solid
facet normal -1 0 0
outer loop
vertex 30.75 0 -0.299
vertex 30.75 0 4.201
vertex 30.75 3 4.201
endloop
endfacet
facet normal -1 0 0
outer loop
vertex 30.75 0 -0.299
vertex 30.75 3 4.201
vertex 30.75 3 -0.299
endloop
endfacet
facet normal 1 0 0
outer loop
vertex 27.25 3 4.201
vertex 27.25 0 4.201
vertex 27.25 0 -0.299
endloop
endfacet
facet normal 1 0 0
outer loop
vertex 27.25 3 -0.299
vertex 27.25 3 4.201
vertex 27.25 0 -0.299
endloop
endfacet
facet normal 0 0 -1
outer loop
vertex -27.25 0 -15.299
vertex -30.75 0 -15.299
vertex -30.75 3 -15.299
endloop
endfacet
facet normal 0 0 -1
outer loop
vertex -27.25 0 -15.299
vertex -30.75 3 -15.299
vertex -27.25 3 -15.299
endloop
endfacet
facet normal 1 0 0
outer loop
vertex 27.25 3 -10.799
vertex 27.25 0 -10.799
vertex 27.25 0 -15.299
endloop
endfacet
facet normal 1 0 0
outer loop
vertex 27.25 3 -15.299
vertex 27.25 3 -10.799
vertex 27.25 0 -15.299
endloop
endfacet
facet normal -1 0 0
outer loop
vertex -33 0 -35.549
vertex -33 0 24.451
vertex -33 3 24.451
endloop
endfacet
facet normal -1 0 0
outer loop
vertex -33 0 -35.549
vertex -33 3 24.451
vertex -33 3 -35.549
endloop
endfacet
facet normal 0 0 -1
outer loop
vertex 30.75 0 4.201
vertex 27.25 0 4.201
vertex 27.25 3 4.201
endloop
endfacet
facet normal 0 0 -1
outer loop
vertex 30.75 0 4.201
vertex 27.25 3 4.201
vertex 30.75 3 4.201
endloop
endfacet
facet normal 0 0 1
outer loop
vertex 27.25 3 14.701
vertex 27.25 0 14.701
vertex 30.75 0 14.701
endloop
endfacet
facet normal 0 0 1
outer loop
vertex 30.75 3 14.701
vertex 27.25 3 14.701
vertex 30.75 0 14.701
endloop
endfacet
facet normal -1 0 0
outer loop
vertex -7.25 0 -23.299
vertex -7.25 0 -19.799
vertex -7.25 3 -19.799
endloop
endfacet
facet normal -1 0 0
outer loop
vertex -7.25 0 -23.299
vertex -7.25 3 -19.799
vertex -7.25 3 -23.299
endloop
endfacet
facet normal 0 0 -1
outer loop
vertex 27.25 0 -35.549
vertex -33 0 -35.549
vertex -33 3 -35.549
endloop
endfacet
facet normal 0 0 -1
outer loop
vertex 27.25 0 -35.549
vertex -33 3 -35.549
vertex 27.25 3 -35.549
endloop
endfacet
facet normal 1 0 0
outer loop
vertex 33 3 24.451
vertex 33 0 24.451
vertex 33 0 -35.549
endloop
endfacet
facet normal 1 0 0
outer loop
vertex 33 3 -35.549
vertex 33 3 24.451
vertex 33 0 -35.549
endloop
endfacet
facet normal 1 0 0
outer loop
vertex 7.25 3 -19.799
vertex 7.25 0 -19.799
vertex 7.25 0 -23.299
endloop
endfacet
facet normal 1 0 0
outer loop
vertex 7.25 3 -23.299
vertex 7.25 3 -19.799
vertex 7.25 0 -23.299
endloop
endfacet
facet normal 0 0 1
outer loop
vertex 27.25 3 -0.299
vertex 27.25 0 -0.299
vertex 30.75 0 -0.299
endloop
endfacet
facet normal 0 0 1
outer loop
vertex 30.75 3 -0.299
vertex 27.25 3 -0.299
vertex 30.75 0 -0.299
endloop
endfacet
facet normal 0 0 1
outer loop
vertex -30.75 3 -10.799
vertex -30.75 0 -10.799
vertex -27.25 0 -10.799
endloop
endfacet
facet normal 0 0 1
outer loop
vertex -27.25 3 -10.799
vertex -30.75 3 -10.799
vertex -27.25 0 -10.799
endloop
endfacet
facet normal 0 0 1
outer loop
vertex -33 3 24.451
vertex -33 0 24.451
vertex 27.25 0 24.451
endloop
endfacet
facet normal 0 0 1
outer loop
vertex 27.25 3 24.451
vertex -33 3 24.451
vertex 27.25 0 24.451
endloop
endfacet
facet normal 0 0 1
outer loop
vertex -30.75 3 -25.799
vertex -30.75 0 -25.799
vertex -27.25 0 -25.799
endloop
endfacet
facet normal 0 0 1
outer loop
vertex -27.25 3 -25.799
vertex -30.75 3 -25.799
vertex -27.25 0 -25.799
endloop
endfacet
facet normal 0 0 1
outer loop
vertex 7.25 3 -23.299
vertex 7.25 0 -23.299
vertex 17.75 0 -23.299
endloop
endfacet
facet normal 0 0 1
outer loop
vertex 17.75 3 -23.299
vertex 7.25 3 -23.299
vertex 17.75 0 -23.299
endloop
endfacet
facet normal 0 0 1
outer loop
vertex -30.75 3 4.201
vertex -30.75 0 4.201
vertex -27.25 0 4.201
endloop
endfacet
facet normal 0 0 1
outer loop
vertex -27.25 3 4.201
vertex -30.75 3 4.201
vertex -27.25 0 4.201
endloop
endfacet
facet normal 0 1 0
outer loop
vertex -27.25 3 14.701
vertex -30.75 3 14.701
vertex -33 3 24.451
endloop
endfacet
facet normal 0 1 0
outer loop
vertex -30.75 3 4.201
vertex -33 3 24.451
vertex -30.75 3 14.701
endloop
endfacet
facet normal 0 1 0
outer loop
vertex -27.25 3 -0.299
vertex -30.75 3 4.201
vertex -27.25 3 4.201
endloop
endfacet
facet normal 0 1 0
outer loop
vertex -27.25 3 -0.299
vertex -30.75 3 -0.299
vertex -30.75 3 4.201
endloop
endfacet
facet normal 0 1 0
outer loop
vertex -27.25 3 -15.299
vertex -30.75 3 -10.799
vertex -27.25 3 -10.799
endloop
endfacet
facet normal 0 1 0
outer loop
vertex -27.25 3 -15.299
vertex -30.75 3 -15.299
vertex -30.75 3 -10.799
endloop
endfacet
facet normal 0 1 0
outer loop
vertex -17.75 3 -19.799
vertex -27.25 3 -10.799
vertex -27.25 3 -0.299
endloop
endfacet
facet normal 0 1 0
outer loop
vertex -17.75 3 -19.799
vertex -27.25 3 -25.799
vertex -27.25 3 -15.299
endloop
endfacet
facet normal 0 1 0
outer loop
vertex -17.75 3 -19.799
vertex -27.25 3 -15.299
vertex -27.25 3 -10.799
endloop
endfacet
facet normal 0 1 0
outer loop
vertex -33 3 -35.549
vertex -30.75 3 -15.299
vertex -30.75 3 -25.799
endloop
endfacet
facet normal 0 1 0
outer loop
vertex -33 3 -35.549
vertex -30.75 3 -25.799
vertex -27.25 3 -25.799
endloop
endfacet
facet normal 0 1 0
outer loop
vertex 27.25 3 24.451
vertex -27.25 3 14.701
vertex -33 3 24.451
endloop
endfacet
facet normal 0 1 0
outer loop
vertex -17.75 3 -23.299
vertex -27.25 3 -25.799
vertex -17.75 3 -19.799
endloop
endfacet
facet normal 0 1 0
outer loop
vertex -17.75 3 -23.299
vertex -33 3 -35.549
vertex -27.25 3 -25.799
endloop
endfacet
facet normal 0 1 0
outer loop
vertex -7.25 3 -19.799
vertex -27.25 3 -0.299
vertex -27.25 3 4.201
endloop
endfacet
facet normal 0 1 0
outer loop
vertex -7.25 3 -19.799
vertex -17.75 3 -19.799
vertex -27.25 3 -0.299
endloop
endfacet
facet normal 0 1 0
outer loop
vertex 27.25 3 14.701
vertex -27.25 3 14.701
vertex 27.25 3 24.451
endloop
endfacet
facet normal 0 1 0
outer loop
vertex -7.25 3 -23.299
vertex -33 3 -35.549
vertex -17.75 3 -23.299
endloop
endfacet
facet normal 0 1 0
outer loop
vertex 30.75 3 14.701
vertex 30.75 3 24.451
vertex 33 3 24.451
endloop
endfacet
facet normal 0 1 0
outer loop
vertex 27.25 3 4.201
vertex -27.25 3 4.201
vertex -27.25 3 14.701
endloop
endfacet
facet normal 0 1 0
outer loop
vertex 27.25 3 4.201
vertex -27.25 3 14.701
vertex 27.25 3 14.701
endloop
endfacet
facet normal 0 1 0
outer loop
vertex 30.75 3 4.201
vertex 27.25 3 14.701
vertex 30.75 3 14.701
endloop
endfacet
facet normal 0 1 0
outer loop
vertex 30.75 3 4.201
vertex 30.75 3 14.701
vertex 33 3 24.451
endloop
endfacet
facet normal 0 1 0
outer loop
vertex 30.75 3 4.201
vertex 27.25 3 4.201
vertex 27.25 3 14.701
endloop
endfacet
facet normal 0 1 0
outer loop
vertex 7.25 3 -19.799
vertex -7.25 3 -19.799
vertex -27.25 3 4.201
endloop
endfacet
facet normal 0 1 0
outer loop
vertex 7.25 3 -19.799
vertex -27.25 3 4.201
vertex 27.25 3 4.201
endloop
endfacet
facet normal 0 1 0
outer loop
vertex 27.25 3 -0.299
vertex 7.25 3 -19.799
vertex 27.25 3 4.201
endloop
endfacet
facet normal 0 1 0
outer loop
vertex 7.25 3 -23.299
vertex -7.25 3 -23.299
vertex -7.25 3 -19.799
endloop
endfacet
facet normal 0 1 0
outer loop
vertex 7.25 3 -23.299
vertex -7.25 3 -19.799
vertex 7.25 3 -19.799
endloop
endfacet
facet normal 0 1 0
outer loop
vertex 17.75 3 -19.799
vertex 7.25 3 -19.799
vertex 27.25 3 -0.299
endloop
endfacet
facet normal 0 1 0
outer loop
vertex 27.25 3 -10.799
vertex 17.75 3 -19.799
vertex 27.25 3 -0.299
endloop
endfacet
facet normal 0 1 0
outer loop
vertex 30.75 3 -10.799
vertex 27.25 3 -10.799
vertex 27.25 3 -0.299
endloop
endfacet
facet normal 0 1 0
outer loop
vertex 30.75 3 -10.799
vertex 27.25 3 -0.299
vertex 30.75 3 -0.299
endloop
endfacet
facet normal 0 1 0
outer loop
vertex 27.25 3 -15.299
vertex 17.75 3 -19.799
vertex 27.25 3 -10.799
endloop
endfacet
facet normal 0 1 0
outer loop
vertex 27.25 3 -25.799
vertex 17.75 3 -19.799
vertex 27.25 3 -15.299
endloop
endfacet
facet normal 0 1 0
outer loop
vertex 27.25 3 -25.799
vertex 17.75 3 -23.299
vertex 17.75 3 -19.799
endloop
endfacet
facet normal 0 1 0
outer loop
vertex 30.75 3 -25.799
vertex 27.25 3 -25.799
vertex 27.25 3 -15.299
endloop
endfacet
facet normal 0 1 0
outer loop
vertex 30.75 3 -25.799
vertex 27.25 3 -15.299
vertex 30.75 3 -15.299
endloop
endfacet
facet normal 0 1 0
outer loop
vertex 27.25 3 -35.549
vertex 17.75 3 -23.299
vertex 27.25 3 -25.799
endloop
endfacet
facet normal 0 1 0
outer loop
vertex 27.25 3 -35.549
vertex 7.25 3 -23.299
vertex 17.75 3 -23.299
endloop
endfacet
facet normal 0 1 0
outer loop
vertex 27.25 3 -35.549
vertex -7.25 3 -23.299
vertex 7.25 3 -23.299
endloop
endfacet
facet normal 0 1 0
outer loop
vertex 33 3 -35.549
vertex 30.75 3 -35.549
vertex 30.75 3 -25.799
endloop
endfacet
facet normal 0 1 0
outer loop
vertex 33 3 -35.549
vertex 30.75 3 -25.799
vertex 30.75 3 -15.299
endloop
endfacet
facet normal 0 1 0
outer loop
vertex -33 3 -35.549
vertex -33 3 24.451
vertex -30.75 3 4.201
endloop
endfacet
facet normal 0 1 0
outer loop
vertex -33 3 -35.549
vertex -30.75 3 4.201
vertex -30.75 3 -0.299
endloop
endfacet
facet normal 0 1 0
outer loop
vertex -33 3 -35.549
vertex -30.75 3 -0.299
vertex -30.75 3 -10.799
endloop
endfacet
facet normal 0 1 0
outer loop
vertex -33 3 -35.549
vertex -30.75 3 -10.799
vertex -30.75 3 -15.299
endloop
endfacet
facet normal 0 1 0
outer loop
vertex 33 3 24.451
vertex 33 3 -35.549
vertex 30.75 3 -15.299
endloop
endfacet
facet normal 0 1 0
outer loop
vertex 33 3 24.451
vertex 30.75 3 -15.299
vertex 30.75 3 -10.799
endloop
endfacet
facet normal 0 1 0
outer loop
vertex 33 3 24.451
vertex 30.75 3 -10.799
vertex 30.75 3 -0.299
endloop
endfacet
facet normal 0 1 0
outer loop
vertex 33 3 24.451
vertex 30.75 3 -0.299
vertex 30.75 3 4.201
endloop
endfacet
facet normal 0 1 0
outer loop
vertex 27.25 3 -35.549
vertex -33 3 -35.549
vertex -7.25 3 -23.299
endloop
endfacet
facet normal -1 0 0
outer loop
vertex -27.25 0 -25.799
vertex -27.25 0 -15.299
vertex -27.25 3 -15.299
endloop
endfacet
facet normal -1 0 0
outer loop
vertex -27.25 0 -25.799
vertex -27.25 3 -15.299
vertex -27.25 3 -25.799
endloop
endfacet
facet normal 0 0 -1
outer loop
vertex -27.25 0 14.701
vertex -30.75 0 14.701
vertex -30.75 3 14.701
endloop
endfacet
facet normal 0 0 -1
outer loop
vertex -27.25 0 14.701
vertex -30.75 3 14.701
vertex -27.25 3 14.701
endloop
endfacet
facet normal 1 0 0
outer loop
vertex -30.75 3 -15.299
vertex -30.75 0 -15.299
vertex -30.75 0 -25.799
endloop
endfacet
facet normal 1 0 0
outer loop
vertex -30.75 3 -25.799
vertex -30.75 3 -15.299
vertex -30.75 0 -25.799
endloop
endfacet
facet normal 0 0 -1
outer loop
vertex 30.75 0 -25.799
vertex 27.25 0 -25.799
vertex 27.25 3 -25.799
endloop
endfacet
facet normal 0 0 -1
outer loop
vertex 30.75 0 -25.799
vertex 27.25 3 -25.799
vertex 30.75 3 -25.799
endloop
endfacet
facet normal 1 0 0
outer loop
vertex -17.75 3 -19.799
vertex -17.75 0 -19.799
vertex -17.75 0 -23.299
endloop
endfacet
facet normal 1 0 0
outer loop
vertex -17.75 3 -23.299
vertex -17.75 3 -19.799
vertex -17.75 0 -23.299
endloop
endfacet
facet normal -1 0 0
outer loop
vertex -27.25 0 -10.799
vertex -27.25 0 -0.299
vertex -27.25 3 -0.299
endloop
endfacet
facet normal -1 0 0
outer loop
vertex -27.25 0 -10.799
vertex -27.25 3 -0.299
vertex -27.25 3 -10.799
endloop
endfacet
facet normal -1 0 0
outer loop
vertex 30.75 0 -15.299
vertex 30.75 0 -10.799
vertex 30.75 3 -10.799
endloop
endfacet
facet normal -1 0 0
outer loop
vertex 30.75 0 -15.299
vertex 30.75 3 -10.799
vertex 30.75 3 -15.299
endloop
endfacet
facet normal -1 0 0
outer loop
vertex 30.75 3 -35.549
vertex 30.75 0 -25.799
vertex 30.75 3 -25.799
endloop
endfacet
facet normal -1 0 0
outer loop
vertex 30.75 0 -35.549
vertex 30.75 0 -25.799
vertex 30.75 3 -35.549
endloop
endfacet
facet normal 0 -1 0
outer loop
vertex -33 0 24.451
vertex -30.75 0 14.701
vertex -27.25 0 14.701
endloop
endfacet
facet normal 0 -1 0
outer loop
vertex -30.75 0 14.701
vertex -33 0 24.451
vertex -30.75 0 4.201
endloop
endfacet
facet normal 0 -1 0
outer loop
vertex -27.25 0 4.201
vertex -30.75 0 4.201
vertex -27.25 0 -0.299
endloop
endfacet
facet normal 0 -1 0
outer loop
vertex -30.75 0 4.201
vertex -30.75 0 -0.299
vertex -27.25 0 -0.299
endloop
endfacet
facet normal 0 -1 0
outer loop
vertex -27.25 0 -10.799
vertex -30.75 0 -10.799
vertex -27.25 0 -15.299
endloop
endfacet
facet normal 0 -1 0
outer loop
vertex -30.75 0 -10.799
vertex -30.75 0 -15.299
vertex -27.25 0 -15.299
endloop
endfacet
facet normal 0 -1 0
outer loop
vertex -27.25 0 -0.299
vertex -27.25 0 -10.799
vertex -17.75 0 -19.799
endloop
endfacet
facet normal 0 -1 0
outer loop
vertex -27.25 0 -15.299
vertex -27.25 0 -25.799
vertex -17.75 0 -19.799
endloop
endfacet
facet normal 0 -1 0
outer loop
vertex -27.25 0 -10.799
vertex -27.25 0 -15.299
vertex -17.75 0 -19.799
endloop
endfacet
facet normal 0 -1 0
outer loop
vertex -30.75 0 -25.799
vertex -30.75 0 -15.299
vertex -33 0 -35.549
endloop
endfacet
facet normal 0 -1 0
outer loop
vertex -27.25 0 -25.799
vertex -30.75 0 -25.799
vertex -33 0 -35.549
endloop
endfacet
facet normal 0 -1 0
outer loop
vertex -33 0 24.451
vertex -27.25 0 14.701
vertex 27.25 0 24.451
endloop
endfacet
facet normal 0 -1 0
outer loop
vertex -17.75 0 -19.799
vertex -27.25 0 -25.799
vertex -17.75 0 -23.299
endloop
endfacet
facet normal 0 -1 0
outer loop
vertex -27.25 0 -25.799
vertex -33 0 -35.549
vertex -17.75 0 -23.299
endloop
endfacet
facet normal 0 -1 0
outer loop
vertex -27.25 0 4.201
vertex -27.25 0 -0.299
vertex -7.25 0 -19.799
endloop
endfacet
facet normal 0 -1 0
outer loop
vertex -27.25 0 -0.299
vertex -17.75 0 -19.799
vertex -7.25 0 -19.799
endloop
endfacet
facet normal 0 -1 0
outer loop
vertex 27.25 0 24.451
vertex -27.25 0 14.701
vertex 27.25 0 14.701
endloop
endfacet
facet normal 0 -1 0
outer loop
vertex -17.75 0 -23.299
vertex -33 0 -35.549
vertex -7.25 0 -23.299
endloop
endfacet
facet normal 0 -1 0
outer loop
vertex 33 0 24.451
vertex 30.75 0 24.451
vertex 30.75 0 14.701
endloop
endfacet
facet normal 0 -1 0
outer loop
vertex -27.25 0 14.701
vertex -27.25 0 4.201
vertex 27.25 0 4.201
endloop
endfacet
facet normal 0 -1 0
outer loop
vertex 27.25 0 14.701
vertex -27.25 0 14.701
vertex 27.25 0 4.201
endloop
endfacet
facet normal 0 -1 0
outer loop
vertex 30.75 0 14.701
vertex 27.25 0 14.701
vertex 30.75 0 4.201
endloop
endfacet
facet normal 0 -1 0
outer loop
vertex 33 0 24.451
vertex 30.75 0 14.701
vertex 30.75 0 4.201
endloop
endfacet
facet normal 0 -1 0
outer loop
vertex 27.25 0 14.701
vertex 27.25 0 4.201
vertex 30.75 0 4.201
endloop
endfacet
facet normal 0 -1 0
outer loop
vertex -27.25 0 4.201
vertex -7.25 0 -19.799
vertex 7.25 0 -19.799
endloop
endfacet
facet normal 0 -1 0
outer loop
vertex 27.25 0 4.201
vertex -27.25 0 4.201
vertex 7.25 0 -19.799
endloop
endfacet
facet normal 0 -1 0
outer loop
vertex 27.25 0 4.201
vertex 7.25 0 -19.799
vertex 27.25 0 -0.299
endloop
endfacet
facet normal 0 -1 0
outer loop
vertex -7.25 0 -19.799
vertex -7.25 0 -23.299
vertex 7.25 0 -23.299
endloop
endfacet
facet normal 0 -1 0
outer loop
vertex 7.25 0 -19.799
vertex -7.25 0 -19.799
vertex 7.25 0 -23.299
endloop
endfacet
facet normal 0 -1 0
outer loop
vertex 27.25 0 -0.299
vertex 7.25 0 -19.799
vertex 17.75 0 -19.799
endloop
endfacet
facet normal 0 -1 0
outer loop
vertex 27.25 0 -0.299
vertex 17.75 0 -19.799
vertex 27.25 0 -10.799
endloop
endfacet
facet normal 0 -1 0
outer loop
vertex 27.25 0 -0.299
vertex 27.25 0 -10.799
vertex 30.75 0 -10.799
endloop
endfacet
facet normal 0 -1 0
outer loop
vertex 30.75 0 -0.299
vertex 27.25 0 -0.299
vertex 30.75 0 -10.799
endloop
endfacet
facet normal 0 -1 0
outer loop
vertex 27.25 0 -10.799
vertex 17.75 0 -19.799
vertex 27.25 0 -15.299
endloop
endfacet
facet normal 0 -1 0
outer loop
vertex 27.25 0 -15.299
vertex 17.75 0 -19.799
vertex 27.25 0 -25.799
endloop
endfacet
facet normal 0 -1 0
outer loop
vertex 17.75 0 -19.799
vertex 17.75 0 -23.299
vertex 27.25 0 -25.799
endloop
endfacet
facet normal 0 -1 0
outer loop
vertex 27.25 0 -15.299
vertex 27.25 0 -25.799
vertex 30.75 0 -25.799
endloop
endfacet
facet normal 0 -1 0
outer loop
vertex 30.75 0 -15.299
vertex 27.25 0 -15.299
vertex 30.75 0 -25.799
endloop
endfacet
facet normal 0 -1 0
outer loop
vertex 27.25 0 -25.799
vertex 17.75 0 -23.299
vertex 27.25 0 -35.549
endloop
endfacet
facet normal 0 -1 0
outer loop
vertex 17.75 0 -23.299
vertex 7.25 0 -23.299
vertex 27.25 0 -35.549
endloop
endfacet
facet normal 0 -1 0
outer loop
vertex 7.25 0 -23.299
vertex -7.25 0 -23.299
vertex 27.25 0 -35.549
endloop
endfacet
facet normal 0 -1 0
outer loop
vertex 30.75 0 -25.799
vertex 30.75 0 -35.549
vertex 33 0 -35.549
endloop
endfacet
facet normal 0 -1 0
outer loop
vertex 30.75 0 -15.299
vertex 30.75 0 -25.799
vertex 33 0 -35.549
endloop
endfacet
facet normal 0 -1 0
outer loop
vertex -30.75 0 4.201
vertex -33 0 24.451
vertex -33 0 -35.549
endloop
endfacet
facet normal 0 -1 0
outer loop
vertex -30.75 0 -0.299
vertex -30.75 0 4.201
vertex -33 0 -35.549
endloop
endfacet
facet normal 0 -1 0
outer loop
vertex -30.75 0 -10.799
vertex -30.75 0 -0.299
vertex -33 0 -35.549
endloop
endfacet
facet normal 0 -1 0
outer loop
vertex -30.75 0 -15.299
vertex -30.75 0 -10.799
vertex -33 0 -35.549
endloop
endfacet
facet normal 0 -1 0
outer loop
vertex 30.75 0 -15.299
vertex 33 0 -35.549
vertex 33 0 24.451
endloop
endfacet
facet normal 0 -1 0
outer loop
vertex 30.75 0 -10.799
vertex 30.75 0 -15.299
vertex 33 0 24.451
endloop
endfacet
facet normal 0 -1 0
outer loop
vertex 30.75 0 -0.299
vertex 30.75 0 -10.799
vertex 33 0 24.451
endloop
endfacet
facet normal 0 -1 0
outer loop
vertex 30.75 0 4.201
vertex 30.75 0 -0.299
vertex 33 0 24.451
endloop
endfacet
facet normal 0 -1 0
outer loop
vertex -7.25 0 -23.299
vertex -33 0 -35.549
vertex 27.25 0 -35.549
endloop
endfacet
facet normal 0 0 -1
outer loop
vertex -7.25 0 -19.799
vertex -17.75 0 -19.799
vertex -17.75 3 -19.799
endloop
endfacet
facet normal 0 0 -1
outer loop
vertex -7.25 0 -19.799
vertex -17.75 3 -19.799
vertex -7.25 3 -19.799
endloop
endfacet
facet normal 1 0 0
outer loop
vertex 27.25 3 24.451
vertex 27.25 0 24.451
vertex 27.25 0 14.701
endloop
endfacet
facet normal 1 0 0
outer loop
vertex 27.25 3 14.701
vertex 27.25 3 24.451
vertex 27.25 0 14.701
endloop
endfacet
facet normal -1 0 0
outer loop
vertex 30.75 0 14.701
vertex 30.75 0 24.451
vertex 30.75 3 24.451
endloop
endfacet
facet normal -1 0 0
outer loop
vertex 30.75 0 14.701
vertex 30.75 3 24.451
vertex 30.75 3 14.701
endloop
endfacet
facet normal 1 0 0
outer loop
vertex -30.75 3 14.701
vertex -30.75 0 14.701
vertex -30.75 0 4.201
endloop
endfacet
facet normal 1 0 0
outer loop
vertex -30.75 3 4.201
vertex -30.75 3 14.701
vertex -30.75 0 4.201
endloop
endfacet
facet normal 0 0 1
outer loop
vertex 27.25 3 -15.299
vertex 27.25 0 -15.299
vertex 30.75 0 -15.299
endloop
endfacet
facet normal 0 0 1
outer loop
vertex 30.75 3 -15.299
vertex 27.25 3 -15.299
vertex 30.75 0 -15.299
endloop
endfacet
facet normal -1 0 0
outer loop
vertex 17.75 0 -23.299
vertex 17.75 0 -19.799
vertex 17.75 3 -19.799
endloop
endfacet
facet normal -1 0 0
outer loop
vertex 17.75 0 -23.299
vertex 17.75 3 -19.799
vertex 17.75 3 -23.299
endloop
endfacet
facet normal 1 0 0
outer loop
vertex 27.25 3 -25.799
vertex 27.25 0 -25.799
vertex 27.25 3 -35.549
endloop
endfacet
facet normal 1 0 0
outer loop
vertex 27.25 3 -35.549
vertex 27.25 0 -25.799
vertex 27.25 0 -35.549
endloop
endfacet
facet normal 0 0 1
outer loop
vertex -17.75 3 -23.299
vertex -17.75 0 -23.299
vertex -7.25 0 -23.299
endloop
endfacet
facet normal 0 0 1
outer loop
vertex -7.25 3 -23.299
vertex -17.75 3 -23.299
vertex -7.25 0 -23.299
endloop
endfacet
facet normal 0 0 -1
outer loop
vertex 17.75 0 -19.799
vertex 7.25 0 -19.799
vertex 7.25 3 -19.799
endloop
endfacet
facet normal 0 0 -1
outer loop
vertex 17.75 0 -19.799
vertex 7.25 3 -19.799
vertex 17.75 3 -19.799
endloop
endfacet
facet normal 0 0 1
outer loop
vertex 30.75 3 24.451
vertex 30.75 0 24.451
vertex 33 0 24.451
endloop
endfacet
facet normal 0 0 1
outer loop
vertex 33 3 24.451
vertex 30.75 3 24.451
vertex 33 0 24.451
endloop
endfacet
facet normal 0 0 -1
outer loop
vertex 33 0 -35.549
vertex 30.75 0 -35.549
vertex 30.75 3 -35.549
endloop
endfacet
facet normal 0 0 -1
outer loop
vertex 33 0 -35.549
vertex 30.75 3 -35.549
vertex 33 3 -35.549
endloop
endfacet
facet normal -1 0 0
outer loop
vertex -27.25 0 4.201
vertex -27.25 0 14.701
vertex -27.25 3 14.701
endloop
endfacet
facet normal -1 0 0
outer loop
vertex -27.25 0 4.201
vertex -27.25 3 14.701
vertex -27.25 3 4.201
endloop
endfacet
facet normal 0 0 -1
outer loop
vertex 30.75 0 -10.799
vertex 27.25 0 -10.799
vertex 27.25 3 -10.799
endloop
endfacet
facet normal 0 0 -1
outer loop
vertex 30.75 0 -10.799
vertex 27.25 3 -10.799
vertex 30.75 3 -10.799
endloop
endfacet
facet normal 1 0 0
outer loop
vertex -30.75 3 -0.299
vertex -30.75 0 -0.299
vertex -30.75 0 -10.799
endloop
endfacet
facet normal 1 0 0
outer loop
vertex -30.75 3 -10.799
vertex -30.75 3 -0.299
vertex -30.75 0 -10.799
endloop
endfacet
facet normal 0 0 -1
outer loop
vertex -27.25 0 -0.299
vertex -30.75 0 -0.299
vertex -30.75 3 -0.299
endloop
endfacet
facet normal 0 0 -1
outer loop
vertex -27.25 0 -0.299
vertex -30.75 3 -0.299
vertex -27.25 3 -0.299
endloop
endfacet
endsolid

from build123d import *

# Parameters (mm, degrees)
SKETCH_3_W          = 66
SKETCH_3_H          = 60
EXTRUDE_1_DEPTH     = 3
SKETCH_1_W          = 3.5
SKETCH_1_H          = 10.5
SKETCH_1_W_2        = 10.5
SKETCH_1_H_2        = 3.5
SKETCH_1_H_3        = 9.75
SKETCH_1_H_4        = 4.5
CUT_EXTRUDE_1_DEPTH = 49.597691494


with BuildPart() as part:
    # Эскиз3 → Бобышка-Вытянуть1 (new body)
    with BuildSketch(Plane(origin=(0, 0, 0), x_dir=(1, 0, 0), z_dir=(0, 1, 0))):
        with Locations((0, 5.54905932)):
            Rectangle(SKETCH_3_W, SKETCH_3_H)
    extrude(amount=EXTRUDE_1_DEPTH)

    # Эскиз1 → Вырез-Вытянуть1 (cut, through all)
    with BuildSketch(Plane(origin=(0, 0, 0), x_dir=(1, 0, 0), z_dir=(0, 1, 0))):
        with Locations((-29, 5.54905932)):
            Rectangle(SKETCH_1_W, SKETCH_1_H)
        with Locations((-29, 20.54905932)):
            Rectangle(SKETCH_1_W, SKETCH_1_H)
        with Locations((-29, -9.45094068)):
            Rectangle(SKETCH_1_W, SKETCH_1_H)
        with Locations((12.5, 21.54905932)):
            Rectangle(SKETCH_1_W_2, SKETCH_1_H_2)
        with Locations((29, -19.57594068)):
            Rectangle(SKETCH_1_W, SKETCH_1_H_3)
        with Locations((29, 13.04905932)):
            Rectangle(SKETCH_1_W, SKETCH_1_H_4)
        with Locations((29, -1.95094068)):
            Rectangle(SKETCH_1_W, SKETCH_1_H_4)
        with Locations((29, 30.67405932)):
            Rectangle(SKETCH_1_W, SKETCH_1_H_3)
        with Locations((-12.5, 21.54905932)):
            Rectangle(SKETCH_1_W_2, SKETCH_1_H_2)
    extrude(amount=CUT_EXTRUDE_1_DEPTH, mode=Mode.SUBTRACT)


solid = part.part
